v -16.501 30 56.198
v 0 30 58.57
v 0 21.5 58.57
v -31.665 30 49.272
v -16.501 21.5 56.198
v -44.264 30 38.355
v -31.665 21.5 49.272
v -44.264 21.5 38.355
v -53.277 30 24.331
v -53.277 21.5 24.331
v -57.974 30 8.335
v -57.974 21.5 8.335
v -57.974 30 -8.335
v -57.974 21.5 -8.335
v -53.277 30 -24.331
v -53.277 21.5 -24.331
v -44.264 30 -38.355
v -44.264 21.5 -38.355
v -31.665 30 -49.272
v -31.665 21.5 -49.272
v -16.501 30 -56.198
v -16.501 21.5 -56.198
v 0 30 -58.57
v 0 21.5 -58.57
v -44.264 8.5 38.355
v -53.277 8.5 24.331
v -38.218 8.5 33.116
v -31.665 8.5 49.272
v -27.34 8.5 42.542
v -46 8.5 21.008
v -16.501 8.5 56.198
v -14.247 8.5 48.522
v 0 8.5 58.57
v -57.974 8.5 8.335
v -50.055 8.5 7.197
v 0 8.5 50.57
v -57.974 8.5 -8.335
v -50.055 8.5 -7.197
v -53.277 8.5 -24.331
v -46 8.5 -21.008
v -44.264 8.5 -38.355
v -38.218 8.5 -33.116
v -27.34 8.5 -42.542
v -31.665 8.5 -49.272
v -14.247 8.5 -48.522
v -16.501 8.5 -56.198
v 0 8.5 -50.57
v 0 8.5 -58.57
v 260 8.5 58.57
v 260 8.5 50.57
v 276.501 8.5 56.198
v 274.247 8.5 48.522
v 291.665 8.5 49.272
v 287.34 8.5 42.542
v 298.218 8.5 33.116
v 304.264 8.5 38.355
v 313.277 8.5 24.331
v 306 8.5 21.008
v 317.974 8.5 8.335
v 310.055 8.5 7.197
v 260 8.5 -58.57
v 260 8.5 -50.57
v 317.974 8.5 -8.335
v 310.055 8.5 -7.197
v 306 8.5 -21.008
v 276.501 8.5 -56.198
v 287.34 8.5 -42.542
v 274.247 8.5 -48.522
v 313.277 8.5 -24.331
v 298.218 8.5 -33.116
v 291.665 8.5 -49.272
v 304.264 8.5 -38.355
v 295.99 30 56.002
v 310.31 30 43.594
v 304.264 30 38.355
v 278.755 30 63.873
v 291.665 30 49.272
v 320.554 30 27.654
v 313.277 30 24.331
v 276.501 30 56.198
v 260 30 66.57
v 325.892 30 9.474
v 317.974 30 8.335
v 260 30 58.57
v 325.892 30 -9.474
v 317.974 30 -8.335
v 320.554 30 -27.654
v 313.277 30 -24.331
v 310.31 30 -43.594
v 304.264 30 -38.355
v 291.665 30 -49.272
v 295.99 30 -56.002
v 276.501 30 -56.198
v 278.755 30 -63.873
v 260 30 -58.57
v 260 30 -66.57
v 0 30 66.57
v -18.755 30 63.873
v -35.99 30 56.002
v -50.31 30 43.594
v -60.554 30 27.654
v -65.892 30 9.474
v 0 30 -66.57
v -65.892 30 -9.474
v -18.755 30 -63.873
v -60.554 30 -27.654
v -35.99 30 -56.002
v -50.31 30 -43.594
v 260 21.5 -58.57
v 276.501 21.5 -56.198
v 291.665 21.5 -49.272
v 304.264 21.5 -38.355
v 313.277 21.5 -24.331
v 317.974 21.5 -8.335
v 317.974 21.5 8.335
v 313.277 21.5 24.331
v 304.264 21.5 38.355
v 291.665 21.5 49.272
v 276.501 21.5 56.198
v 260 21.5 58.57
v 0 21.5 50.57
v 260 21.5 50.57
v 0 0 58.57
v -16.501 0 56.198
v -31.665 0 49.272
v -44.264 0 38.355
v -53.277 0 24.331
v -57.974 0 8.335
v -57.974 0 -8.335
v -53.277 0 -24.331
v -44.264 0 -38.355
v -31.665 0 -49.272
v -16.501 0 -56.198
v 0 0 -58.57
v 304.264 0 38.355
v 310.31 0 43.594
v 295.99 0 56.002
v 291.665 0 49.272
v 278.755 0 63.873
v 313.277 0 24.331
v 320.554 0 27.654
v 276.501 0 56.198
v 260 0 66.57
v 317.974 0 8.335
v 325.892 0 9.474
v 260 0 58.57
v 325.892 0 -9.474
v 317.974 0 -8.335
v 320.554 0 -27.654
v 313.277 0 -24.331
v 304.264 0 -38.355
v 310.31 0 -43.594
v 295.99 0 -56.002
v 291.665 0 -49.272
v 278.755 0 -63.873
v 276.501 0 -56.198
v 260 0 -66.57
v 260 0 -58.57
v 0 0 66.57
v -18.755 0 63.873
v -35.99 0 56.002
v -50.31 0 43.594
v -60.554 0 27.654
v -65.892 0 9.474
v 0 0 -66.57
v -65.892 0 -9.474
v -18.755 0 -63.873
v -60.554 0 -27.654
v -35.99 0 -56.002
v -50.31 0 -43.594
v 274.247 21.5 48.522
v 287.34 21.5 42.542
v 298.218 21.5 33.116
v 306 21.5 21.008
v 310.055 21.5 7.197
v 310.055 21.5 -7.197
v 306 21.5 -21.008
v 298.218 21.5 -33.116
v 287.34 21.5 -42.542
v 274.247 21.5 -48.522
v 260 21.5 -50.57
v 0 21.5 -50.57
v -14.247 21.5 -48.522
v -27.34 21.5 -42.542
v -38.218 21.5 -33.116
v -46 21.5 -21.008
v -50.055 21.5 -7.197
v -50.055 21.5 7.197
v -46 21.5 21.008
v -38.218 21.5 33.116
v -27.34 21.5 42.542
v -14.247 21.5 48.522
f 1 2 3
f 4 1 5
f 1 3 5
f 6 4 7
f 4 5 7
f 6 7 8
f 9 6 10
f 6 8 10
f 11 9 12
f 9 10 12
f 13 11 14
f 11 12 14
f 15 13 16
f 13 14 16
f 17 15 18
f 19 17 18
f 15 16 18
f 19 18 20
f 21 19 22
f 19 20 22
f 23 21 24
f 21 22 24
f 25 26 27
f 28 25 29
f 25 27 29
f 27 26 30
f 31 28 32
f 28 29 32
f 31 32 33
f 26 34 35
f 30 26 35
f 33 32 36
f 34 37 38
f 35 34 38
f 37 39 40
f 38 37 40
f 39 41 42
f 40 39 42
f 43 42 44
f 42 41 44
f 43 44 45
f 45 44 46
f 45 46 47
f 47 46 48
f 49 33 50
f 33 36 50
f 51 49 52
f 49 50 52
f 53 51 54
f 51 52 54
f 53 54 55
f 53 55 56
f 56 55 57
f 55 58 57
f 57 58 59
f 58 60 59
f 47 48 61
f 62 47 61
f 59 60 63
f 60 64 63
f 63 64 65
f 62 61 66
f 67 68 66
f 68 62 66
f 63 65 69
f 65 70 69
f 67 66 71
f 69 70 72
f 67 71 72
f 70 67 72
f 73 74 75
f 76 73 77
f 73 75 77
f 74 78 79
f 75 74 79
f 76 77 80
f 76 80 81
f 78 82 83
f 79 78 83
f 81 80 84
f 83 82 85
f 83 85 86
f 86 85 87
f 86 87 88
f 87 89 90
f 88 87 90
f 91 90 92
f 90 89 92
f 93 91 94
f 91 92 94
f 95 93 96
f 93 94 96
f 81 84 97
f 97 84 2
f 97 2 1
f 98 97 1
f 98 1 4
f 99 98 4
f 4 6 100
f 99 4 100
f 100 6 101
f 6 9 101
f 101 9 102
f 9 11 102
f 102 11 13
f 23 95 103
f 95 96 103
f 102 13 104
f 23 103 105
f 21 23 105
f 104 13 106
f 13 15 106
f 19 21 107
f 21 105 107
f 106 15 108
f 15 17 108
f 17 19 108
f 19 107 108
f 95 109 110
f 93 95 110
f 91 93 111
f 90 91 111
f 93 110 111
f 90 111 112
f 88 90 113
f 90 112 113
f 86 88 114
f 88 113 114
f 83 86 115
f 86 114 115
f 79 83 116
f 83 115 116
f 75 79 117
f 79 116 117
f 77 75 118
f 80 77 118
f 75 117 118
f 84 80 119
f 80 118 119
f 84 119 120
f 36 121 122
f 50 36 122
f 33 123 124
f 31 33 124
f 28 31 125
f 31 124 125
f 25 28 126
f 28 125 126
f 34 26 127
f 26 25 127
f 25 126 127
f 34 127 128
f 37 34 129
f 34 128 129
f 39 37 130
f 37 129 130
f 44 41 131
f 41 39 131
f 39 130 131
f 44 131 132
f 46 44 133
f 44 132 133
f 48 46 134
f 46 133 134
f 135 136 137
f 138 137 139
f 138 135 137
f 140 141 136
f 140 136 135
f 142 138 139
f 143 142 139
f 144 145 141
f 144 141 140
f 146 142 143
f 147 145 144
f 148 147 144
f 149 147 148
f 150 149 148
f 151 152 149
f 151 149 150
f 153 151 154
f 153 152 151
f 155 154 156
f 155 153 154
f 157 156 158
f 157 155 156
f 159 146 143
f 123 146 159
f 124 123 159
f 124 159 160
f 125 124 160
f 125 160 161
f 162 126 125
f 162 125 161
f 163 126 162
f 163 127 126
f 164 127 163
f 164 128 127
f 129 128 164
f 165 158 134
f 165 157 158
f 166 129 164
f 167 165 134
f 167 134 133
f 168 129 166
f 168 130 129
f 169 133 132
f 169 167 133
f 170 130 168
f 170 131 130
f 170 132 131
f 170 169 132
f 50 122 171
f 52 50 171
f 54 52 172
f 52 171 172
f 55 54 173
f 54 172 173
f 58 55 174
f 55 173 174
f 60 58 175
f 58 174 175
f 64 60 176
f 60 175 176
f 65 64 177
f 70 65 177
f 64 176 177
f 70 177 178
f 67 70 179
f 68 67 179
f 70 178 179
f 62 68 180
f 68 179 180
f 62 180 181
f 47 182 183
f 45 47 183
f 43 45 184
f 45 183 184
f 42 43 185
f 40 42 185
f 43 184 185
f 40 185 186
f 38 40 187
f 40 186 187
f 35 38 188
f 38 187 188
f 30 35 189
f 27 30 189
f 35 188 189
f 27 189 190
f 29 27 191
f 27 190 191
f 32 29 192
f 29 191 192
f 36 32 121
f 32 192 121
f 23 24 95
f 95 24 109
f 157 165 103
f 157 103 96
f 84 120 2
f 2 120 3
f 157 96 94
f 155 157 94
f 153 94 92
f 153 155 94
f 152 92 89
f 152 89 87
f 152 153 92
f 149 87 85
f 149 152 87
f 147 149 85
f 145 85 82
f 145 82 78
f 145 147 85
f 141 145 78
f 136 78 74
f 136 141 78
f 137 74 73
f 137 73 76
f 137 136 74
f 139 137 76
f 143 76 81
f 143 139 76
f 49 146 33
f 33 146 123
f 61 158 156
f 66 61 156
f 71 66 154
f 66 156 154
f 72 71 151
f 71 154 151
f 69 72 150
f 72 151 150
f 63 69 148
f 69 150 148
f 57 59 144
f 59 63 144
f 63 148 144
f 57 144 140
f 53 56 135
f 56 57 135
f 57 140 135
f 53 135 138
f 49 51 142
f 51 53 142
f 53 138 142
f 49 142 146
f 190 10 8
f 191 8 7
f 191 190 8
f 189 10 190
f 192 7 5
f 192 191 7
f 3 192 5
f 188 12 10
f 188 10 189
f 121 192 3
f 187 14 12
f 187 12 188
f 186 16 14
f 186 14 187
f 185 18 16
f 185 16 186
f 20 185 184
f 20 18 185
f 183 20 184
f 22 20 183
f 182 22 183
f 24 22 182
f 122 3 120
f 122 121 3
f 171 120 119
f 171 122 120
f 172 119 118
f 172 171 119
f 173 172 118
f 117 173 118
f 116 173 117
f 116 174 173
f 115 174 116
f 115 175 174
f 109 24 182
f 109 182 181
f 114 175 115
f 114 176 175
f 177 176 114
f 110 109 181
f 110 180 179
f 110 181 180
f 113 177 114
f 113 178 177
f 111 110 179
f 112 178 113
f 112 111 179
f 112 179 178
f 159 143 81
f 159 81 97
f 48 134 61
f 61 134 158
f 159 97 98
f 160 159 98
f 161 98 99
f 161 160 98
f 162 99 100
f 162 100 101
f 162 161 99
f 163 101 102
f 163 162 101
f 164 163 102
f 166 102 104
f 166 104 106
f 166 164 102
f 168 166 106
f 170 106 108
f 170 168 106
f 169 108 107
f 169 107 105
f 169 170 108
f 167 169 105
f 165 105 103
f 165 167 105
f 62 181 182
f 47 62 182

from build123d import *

# Parameters (mm, degrees)
BOSS_EXTRUDE1_DEPTH      = 30
BOSS_EXTRUDE2_DEPTH      = 6.5
BOSS_EXTRUDE2_DEPTH_BACK = 6.5


with BuildPart() as part:
    # Sketch1 → Boss-Extrude1 (new body)
    with BuildSketch(Plane(origin=(0, 0, 0), x_dir=(1, 0, 0), z_dir=(0, 1, 0))):
        with BuildLine():
            Line((0, 66.57), (260, 66.57))
            ThreePointArc((260, 66.57), (326.57, 0), (260, -66.57))
            Line((260, -66.57), (0, -66.57))
            ThreePointArc((0, -66.57), (-66.57, 0), (0, 66.57))
        make_face()
        with BuildLine():
            Line((0, 58.57), (260, 58.57))
            ThreePointArc((260, 58.57), (318.57, 0), (260, -58.57))
            Line((260, -58.57), (0, -58.57))
            ThreePointArc((0, -58.57), (-58.57, 0), (0, 58.57))
        make_face(mode=Mode.SUBTRACT)
    extrude(amount=BOSS_EXTRUDE1_DEPTH)

    # Sketch2 → Boss-Extrude2 (add, two sides: drawn at the far end of the back side and taken through both)
    with BuildSketch(Plane(origin=(0, 15, 0), x_dir=(-1, 0, 0), z_dir=(0, -1, 0)).offset(-BOSS_EXTRUDE2_DEPTH_BACK)):
        with BuildLine():
            Line((0, -58.57), (-260, -58.57))
            ThreePointArc((-260, -58.57), (-318.57, 0), (-260, 58.57))
            Line((-260, 58.57), (0, 58.57))
            ThreePointArc((0, 58.57), (58.57, 0), (0, -58.57))
        make_face()
        with BuildLine():
            Line((0, -50.57), (-260, -50.57))
            ThreePointArc((-260, -50.57), (-310.57, 0), (-260, 50.57))
            Line((-260, 50.57), (0, 50.57))
            ThreePointArc((0, 50.57), (50.57, 0), (0, -50.57))
        make_face(mode=Mode.SUBTRACT)
    extrude(amount=BOSS_EXTRUDE2_DEPTH + BOSS_EXTRUDE2_DEPTH_BACK)


solid = part.part
